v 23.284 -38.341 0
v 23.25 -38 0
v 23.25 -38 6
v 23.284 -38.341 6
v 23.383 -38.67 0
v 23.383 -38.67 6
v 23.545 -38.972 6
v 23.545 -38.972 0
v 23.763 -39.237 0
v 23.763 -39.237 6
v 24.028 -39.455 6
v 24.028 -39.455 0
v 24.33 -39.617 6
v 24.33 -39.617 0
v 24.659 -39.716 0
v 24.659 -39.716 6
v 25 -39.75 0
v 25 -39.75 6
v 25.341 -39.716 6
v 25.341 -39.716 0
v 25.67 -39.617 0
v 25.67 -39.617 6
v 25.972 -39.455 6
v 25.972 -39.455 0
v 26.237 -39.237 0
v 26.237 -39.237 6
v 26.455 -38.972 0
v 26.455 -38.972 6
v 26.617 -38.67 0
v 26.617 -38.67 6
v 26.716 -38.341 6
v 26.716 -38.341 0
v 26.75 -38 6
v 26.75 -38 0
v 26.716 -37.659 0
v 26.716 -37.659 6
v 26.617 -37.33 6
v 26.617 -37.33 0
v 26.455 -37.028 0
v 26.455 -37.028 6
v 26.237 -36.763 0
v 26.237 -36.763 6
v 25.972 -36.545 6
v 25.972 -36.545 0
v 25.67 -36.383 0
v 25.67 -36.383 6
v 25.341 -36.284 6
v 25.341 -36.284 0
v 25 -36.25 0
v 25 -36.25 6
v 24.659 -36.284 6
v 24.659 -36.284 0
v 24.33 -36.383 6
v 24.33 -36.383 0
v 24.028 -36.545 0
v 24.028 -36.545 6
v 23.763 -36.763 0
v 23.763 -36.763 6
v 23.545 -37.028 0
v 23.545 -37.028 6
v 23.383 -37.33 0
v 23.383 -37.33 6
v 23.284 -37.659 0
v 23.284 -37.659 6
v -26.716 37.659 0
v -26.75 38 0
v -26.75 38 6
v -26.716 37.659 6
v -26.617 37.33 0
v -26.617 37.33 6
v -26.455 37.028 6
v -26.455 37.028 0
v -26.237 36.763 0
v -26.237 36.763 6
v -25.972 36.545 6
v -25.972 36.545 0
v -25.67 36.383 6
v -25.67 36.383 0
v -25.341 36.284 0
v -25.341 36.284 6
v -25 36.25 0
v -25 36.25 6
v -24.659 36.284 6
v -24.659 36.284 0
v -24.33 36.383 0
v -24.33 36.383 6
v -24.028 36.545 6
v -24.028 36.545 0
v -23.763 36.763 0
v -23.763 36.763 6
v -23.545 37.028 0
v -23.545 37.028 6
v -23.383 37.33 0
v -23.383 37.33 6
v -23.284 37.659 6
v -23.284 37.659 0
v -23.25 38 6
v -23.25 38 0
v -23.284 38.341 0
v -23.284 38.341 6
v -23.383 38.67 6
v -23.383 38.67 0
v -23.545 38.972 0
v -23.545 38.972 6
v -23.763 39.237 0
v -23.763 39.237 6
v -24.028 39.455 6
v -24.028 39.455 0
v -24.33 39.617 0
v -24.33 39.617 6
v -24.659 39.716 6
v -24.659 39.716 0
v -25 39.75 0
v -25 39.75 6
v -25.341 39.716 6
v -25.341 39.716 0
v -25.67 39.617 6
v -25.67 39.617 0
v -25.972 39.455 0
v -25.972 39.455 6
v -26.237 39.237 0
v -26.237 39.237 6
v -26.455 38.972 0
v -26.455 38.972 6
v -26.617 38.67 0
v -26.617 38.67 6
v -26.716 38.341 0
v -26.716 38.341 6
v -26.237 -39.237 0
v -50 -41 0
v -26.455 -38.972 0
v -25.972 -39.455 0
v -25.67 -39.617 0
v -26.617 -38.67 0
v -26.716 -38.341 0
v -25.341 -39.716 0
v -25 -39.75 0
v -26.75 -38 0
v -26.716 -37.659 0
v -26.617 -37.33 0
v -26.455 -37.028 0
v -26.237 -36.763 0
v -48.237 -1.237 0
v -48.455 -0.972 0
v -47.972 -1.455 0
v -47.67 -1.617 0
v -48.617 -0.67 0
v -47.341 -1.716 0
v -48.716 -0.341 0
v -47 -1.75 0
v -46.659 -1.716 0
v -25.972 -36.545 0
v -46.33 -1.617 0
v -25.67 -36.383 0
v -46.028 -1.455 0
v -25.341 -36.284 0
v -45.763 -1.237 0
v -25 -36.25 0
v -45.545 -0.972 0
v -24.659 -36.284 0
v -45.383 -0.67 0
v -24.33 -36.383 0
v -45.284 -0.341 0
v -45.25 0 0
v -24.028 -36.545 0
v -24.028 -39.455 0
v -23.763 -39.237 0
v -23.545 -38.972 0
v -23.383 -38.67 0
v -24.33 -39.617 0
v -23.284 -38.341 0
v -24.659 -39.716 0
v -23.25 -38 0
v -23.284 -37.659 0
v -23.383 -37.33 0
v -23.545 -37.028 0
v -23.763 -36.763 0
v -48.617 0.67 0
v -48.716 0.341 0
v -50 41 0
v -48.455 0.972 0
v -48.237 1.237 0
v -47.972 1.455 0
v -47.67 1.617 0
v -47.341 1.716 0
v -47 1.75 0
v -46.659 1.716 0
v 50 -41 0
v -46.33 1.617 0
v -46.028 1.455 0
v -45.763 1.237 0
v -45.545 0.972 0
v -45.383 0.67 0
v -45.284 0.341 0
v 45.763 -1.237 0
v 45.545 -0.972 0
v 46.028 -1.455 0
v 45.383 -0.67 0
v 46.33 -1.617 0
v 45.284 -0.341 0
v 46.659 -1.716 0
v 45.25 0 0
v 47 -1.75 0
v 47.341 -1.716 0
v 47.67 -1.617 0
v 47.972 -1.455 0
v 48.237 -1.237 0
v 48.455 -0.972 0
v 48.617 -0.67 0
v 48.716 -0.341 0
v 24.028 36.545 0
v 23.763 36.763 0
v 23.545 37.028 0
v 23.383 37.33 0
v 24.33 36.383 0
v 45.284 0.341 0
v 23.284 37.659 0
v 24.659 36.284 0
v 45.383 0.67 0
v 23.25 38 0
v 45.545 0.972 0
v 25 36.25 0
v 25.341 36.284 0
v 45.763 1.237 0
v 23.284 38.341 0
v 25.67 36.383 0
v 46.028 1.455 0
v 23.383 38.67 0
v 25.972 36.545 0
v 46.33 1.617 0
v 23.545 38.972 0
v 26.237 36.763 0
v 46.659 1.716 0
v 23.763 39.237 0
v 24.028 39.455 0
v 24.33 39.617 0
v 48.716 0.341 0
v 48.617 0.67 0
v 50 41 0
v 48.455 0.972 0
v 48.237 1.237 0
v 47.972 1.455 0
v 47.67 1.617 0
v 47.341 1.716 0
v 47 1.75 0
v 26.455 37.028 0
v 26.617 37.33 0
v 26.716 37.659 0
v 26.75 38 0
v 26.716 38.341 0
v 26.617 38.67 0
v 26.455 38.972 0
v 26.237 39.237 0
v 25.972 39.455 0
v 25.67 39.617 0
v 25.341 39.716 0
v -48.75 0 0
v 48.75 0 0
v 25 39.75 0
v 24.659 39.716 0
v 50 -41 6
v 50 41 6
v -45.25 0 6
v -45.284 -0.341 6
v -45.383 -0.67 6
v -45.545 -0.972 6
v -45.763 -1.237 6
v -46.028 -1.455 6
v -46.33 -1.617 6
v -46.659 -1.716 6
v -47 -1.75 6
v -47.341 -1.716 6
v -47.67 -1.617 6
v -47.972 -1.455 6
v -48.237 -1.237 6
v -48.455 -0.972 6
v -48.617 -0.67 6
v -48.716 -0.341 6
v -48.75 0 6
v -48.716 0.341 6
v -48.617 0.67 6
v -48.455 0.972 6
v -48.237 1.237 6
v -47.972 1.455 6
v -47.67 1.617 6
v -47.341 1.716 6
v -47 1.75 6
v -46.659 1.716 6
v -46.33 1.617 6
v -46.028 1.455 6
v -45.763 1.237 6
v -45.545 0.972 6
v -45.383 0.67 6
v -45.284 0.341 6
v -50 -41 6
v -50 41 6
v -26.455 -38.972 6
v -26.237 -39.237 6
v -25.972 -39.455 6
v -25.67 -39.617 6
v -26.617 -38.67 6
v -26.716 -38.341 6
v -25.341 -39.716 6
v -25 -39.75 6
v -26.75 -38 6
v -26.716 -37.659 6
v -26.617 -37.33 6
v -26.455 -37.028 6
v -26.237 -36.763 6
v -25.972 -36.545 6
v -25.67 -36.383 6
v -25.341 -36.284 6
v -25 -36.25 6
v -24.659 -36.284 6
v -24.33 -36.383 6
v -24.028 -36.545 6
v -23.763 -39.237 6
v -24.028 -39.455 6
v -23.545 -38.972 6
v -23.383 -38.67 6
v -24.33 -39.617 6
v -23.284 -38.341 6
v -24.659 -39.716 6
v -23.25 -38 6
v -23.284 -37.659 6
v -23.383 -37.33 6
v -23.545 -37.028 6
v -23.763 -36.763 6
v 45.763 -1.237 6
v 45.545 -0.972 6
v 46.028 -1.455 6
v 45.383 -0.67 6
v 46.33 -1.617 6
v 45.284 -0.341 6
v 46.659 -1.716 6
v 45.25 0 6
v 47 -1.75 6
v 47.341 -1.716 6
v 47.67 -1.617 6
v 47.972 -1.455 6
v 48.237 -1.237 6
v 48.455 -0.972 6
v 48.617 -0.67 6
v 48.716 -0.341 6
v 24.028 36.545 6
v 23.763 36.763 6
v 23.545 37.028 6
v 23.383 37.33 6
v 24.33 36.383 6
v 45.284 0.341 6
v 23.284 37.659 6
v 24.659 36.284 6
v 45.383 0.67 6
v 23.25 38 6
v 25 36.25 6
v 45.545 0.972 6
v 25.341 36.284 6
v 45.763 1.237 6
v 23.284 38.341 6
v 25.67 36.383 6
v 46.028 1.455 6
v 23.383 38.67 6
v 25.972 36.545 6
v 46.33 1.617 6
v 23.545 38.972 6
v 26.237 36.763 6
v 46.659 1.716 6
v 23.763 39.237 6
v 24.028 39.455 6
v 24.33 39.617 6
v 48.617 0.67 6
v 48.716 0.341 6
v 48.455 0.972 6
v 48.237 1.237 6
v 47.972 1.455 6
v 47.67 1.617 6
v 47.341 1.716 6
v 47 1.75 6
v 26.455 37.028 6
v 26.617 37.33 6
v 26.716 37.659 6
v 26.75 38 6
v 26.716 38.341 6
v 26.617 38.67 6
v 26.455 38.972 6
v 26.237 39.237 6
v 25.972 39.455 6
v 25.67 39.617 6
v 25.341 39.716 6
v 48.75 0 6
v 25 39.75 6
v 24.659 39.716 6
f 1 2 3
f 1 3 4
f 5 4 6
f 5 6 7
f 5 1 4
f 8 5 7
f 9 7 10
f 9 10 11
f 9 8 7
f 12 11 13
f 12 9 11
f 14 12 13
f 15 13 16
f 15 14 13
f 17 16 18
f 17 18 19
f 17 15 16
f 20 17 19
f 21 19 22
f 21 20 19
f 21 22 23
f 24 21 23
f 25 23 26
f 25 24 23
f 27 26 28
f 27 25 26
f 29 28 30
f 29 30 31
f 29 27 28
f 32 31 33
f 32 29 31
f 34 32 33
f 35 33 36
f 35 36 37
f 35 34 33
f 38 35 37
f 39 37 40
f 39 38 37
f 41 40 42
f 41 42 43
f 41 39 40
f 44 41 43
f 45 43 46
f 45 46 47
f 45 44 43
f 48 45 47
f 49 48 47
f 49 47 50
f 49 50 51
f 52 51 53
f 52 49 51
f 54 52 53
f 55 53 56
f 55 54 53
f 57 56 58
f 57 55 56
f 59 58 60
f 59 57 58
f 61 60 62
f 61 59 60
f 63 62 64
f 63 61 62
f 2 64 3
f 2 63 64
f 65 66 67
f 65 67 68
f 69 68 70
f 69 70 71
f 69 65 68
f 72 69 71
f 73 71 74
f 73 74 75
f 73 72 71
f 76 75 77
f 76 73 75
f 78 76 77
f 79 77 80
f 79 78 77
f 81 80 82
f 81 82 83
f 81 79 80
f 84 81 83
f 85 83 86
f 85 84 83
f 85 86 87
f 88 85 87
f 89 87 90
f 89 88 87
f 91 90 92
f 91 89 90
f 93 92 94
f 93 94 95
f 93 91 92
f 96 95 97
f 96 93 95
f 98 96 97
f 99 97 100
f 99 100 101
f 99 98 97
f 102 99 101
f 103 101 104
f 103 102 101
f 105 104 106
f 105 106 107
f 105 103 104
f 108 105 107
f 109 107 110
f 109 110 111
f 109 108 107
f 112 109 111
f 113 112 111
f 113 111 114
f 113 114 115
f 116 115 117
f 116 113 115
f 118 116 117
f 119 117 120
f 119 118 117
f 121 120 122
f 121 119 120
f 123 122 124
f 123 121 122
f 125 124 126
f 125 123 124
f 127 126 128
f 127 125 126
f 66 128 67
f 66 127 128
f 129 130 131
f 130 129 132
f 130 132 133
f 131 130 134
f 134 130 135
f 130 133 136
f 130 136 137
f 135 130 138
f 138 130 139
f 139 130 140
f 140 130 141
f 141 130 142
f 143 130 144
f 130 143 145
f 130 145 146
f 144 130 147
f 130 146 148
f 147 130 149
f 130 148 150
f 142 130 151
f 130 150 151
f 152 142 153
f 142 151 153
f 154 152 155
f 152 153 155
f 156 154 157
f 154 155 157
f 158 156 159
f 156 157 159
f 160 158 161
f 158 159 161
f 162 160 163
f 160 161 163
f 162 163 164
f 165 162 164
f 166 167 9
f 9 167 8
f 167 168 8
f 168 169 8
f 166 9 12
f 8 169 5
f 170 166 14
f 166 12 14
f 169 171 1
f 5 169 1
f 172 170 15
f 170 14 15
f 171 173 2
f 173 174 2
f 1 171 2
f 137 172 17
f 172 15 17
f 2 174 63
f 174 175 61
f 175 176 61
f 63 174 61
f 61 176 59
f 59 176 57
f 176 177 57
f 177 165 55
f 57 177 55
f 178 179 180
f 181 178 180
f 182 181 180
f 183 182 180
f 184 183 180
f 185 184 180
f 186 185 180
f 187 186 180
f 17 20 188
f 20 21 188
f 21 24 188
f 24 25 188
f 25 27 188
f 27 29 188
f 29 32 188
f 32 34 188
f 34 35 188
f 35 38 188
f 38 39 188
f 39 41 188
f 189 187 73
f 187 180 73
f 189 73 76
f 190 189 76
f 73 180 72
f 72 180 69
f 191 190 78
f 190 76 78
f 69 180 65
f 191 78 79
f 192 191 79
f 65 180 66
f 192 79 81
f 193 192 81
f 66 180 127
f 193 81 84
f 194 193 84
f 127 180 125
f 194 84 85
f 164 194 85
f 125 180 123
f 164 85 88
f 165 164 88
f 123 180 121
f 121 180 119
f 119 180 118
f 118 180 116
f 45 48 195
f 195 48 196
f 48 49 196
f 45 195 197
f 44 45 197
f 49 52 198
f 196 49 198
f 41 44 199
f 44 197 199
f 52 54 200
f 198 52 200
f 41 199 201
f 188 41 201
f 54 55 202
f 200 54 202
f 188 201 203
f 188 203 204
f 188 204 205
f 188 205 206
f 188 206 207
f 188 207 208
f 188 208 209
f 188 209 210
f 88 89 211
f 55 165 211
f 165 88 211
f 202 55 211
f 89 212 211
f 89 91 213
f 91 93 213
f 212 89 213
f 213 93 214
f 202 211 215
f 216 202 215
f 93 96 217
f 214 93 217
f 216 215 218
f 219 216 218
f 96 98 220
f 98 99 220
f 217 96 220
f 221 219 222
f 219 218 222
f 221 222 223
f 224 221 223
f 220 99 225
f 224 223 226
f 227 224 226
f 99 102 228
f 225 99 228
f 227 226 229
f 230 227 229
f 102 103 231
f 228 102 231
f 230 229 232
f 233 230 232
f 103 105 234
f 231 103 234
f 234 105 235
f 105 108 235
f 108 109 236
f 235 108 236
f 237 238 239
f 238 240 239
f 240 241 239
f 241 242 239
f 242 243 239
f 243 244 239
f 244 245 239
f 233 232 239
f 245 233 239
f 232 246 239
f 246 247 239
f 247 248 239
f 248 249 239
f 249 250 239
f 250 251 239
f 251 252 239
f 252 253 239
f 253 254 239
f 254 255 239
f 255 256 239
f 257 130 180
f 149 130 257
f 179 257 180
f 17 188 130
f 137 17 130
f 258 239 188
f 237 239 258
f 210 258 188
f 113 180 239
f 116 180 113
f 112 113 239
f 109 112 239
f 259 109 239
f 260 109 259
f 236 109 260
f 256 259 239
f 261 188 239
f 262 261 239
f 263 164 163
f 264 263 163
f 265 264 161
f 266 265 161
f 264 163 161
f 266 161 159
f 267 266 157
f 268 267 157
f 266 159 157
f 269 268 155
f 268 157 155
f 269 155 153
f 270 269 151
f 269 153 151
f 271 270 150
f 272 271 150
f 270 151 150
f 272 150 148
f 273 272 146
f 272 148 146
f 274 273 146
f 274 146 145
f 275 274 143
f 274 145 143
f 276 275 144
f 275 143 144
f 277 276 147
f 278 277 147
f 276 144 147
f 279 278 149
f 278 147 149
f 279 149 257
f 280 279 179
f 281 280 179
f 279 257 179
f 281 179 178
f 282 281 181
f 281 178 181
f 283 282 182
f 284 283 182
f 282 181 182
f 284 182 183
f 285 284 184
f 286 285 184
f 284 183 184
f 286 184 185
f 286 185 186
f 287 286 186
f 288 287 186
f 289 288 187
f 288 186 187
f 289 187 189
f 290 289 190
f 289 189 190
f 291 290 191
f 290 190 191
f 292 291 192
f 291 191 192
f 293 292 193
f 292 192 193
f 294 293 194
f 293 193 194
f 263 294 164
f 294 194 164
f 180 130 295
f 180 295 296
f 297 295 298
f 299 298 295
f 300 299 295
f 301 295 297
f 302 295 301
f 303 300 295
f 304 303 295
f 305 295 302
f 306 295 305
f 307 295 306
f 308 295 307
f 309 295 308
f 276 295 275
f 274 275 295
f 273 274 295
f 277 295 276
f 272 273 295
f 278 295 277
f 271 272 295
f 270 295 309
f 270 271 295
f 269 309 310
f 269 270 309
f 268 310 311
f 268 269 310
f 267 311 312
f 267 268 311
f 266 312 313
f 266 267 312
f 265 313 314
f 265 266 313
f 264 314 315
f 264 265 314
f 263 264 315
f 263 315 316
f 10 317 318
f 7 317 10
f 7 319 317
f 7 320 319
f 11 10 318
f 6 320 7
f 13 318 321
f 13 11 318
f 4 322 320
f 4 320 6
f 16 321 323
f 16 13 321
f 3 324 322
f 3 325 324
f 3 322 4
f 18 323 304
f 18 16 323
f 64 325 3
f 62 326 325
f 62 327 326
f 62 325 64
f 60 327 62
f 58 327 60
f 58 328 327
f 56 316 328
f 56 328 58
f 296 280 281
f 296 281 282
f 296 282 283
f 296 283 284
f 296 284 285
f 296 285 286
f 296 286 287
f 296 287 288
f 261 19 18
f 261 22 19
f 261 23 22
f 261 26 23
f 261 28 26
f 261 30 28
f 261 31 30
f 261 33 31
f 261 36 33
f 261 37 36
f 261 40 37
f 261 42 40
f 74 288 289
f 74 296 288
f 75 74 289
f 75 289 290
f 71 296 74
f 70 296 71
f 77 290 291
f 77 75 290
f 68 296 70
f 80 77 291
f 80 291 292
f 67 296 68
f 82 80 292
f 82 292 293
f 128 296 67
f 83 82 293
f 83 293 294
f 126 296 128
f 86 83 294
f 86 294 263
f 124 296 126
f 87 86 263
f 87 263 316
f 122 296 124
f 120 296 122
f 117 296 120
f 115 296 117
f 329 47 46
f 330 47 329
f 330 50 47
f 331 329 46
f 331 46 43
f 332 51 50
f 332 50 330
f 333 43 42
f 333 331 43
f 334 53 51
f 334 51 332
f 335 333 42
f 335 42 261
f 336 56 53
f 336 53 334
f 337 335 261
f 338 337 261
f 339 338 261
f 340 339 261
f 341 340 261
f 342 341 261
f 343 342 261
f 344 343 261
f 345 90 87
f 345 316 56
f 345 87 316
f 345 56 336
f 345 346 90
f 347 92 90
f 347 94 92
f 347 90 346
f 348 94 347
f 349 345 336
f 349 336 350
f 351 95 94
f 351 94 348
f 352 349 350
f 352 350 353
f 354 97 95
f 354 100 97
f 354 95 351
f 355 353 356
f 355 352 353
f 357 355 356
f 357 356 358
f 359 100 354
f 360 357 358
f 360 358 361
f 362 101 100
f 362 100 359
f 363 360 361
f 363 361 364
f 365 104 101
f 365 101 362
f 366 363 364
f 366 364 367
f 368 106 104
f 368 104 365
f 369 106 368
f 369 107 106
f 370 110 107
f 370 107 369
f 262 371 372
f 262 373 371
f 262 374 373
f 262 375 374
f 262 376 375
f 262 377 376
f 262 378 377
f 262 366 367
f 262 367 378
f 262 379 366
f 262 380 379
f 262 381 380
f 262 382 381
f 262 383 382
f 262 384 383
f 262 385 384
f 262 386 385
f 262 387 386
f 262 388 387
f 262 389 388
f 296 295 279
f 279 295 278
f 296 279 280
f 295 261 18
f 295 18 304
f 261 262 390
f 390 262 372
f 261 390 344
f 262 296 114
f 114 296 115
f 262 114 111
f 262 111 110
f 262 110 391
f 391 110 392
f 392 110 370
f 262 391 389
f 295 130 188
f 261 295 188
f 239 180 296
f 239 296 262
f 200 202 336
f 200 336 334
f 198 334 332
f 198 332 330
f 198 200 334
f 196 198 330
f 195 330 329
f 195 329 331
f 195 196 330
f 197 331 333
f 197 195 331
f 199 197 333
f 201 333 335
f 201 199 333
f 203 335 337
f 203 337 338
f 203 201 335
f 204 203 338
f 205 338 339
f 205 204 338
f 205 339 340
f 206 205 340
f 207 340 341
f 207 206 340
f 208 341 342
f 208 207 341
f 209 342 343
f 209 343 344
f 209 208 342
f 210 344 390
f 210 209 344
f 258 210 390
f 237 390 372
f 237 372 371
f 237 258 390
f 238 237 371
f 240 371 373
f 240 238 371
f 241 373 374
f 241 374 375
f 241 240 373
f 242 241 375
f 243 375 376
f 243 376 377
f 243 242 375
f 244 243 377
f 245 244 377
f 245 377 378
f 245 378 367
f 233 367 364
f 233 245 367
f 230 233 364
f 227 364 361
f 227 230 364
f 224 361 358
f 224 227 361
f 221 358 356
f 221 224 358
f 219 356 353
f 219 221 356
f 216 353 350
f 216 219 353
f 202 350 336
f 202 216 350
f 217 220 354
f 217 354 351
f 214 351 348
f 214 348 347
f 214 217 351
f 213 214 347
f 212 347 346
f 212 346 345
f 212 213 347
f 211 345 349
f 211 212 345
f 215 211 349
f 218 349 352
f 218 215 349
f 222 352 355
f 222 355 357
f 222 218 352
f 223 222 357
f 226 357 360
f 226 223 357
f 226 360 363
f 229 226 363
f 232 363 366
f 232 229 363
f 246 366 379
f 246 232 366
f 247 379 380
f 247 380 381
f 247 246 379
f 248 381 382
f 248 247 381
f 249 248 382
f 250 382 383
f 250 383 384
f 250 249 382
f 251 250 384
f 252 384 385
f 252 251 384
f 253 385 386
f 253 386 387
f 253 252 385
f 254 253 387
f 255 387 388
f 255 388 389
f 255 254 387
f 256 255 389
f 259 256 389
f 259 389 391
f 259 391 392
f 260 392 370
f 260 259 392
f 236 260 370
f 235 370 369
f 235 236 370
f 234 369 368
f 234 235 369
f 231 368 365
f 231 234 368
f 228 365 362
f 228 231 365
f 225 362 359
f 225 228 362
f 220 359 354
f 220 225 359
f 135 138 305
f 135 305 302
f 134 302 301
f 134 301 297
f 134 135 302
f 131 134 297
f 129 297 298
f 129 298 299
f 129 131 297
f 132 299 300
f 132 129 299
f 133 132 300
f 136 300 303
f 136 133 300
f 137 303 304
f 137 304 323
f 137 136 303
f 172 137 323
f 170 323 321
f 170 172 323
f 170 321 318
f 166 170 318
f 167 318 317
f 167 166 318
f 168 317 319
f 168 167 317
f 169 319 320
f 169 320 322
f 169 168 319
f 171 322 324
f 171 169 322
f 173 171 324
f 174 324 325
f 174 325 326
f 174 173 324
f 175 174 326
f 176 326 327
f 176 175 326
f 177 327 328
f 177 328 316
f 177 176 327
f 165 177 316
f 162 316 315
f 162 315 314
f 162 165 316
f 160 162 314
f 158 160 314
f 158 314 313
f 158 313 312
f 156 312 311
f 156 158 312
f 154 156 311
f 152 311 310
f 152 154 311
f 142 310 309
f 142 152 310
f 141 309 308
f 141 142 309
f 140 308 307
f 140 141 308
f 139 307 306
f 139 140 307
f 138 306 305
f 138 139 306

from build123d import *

# Parameters (mm, degrees)
ESQUISSE1_W             = 100
ESQUISSE1_H             = 82
BOSS_EXTRU_1_DEPTH      = 6
ESQUISSE2_R             = 1.75
ENL_V_MAT_EXTRU_1_DEPTH = 6
ESQUISSE3_R             = 1.75
ENL_V_MAT_EXTRU_2_DEPTH = 6


with BuildPart() as part:
    # Esquisse1 → Boss.-Extru.1 (new body)
    with BuildSketch(Plane.XY):
        Rectangle(ESQUISSE1_W, ESQUISSE1_H)
    extrude(amount=BOSS_EXTRU_1_DEPTH)

    # Esquisse2 → Enlèv. mat.-Extru.1 (cut)
    with BuildSketch(Plane.XY):
        with Locations(Location((-25, -38, 0), (0, 0, 180))):
            Circle(ESQUISSE2_R)
        with Locations(Location((25, -38, 0), (0, 0, 180))):
            Circle(ESQUISSE2_R)
        with Locations(Location((-25, 38, 0), (0, 0, 180))):
            Circle(ESQUISSE2_R)
        with Locations(Location((25, 38, 0), (0, 0, 180))):
            Circle(ESQUISSE2_R)
    extrude(amount=ENL_V_MAT_EXTRU_1_DEPTH, mode=Mode.SUBTRACT)

    # Esquisse3 → Enlèv. mat.-Extru.2 (cut)
    with BuildSketch(Plane.XY):
        with Locations(Location((47, 0, 0), (0, 0, 180))):
            Circle(ESQUISSE3_R)
    enl_v_mat_extru_2 = extrude(amount=ENL_V_MAT_EXTRU_2_DEPTH, mode=Mode.SUBTRACT)

    # Symétrie1: Enlèv. mat.-Extru.2 across plane
    add(enl_v_mat_extru_2.mirror(Plane(origin=(0, 0, 0), x_dir=(0, 0, 1), z_dir=(1, 0, 0))), mode=Mode.SUBTRACT)


solid = part.part
